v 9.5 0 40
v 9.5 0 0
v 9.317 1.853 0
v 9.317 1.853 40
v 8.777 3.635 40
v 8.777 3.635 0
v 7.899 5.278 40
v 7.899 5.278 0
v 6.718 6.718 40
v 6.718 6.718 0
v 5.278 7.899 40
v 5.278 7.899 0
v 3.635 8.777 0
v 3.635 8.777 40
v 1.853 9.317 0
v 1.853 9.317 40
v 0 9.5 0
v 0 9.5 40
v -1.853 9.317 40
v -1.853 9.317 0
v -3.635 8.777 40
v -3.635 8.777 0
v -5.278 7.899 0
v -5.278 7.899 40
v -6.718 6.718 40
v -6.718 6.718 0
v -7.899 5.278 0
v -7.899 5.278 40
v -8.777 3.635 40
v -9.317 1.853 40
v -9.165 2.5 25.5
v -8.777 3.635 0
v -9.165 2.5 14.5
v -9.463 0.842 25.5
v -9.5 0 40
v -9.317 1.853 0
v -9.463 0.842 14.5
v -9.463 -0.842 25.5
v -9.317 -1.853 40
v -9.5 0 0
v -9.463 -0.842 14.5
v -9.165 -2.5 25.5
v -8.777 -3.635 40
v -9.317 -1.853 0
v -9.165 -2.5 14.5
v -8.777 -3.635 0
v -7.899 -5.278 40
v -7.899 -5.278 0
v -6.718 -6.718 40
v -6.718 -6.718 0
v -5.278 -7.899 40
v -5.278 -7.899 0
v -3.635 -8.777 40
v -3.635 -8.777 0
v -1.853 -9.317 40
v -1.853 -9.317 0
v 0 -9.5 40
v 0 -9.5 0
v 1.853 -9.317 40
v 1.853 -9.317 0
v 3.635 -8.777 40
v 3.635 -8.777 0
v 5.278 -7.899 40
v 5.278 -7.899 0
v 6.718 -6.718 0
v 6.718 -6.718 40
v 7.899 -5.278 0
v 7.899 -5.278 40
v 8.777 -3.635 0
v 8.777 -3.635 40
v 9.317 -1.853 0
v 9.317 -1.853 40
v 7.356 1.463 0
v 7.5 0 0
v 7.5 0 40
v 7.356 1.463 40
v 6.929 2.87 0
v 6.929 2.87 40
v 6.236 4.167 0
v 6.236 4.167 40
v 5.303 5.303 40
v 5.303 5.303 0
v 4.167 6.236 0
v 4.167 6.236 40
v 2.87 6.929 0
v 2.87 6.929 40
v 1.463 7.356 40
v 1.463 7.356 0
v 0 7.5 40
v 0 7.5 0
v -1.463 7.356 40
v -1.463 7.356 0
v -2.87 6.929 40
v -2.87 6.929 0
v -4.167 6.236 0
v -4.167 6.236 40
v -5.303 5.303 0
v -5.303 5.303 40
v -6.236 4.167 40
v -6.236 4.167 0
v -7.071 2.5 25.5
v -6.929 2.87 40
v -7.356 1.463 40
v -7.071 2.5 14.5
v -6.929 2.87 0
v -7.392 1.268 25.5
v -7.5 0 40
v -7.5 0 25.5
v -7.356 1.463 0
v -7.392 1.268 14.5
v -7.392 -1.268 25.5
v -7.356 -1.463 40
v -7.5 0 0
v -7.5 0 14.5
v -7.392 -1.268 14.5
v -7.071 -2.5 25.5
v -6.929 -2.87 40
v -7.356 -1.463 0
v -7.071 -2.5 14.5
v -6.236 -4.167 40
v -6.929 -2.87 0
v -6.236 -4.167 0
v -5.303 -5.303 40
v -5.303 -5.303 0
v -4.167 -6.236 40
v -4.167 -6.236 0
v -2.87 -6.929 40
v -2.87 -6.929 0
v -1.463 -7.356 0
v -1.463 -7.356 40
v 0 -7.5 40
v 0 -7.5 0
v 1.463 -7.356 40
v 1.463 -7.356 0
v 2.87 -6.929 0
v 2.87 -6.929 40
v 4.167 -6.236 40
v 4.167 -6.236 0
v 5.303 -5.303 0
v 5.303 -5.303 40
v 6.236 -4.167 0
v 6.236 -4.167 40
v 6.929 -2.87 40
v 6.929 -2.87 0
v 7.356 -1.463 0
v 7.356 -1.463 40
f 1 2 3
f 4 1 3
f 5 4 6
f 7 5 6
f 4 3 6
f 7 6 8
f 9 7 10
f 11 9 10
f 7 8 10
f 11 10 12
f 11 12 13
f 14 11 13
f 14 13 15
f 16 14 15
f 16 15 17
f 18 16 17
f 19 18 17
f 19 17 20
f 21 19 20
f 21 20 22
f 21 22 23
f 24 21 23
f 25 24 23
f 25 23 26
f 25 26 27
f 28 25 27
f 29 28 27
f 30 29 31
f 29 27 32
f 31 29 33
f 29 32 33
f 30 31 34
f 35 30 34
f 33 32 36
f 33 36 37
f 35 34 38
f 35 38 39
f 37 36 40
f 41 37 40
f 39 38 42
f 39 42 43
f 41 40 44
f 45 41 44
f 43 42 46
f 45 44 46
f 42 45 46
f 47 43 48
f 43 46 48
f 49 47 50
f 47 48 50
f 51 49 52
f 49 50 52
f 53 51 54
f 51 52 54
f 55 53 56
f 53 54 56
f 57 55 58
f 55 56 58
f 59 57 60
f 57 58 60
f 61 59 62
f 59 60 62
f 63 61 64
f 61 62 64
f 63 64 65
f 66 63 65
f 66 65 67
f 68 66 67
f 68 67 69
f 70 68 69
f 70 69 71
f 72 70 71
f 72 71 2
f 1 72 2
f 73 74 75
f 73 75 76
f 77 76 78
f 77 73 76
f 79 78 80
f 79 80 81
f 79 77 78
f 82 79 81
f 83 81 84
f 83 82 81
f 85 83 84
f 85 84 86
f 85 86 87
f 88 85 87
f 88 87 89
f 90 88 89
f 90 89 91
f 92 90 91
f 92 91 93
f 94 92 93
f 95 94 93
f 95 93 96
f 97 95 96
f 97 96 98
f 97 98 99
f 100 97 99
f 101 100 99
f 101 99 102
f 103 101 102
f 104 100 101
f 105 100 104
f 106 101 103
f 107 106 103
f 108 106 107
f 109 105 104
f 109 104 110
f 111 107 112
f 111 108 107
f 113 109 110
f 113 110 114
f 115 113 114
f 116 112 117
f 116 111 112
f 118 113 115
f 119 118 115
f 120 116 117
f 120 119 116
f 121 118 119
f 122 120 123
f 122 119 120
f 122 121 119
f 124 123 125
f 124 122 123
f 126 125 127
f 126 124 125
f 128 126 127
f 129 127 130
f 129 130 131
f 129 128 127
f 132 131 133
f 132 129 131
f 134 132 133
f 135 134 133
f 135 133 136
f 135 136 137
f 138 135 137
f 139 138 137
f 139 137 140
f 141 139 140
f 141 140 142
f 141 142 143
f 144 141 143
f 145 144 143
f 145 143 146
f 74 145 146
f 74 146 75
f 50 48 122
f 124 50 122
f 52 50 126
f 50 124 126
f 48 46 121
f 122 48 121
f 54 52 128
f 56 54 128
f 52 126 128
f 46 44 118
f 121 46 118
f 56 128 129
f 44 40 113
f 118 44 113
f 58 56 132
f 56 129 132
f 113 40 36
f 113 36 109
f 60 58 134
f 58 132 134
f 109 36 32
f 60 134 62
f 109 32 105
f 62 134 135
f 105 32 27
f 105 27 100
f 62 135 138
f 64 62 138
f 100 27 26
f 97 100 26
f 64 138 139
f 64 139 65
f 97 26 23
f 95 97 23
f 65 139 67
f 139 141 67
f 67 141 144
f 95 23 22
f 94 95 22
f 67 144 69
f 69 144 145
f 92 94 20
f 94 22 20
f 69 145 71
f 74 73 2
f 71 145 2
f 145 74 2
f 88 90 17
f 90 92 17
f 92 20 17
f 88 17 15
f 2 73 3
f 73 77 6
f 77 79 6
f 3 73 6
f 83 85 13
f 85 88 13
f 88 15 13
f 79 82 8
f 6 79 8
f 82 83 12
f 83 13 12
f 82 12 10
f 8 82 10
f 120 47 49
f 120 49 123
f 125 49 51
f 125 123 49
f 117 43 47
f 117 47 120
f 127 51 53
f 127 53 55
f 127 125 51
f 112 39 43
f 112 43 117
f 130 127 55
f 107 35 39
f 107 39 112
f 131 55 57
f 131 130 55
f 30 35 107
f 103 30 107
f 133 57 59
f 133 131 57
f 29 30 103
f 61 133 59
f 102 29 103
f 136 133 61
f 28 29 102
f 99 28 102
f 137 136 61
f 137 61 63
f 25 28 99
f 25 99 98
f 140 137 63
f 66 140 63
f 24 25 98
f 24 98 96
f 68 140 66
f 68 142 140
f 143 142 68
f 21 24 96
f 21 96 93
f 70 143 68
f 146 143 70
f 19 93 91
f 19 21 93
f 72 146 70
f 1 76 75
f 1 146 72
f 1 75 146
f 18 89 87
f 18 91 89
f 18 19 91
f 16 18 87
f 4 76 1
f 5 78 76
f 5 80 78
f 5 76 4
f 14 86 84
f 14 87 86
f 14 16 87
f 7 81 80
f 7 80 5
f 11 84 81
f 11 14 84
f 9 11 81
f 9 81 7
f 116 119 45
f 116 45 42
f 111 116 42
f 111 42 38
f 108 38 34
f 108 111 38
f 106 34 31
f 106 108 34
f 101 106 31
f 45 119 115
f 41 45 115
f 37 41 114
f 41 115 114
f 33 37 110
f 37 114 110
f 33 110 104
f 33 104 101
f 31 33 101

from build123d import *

# Parameters (mm, degrees)
F0_R     = 9.5
F0_R_2   = 7.5
F1_DEPTH = 40
F2_W     = 5
F2_H     = 11
F3_DEPTH = 25


with BuildPart() as f1:
    # F0 (on Top) → F1 (new body)
    with BuildSketch(Plane.XY):
        Circle(F0_R)
        Circle(F0_R_2, mode=Mode.SUBTRACT)
    extrude(amount=F1_DEPTH)

    # F2 (on Right) → F3 (cut)
    with BuildSketch(Plane.YZ):
        with Locations((0, 20)):
            Rectangle(F2_W, F2_H)
    extrude(amount=-F3_DEPTH, mode=Mode.SUBTRACT)


solid = f1.part
